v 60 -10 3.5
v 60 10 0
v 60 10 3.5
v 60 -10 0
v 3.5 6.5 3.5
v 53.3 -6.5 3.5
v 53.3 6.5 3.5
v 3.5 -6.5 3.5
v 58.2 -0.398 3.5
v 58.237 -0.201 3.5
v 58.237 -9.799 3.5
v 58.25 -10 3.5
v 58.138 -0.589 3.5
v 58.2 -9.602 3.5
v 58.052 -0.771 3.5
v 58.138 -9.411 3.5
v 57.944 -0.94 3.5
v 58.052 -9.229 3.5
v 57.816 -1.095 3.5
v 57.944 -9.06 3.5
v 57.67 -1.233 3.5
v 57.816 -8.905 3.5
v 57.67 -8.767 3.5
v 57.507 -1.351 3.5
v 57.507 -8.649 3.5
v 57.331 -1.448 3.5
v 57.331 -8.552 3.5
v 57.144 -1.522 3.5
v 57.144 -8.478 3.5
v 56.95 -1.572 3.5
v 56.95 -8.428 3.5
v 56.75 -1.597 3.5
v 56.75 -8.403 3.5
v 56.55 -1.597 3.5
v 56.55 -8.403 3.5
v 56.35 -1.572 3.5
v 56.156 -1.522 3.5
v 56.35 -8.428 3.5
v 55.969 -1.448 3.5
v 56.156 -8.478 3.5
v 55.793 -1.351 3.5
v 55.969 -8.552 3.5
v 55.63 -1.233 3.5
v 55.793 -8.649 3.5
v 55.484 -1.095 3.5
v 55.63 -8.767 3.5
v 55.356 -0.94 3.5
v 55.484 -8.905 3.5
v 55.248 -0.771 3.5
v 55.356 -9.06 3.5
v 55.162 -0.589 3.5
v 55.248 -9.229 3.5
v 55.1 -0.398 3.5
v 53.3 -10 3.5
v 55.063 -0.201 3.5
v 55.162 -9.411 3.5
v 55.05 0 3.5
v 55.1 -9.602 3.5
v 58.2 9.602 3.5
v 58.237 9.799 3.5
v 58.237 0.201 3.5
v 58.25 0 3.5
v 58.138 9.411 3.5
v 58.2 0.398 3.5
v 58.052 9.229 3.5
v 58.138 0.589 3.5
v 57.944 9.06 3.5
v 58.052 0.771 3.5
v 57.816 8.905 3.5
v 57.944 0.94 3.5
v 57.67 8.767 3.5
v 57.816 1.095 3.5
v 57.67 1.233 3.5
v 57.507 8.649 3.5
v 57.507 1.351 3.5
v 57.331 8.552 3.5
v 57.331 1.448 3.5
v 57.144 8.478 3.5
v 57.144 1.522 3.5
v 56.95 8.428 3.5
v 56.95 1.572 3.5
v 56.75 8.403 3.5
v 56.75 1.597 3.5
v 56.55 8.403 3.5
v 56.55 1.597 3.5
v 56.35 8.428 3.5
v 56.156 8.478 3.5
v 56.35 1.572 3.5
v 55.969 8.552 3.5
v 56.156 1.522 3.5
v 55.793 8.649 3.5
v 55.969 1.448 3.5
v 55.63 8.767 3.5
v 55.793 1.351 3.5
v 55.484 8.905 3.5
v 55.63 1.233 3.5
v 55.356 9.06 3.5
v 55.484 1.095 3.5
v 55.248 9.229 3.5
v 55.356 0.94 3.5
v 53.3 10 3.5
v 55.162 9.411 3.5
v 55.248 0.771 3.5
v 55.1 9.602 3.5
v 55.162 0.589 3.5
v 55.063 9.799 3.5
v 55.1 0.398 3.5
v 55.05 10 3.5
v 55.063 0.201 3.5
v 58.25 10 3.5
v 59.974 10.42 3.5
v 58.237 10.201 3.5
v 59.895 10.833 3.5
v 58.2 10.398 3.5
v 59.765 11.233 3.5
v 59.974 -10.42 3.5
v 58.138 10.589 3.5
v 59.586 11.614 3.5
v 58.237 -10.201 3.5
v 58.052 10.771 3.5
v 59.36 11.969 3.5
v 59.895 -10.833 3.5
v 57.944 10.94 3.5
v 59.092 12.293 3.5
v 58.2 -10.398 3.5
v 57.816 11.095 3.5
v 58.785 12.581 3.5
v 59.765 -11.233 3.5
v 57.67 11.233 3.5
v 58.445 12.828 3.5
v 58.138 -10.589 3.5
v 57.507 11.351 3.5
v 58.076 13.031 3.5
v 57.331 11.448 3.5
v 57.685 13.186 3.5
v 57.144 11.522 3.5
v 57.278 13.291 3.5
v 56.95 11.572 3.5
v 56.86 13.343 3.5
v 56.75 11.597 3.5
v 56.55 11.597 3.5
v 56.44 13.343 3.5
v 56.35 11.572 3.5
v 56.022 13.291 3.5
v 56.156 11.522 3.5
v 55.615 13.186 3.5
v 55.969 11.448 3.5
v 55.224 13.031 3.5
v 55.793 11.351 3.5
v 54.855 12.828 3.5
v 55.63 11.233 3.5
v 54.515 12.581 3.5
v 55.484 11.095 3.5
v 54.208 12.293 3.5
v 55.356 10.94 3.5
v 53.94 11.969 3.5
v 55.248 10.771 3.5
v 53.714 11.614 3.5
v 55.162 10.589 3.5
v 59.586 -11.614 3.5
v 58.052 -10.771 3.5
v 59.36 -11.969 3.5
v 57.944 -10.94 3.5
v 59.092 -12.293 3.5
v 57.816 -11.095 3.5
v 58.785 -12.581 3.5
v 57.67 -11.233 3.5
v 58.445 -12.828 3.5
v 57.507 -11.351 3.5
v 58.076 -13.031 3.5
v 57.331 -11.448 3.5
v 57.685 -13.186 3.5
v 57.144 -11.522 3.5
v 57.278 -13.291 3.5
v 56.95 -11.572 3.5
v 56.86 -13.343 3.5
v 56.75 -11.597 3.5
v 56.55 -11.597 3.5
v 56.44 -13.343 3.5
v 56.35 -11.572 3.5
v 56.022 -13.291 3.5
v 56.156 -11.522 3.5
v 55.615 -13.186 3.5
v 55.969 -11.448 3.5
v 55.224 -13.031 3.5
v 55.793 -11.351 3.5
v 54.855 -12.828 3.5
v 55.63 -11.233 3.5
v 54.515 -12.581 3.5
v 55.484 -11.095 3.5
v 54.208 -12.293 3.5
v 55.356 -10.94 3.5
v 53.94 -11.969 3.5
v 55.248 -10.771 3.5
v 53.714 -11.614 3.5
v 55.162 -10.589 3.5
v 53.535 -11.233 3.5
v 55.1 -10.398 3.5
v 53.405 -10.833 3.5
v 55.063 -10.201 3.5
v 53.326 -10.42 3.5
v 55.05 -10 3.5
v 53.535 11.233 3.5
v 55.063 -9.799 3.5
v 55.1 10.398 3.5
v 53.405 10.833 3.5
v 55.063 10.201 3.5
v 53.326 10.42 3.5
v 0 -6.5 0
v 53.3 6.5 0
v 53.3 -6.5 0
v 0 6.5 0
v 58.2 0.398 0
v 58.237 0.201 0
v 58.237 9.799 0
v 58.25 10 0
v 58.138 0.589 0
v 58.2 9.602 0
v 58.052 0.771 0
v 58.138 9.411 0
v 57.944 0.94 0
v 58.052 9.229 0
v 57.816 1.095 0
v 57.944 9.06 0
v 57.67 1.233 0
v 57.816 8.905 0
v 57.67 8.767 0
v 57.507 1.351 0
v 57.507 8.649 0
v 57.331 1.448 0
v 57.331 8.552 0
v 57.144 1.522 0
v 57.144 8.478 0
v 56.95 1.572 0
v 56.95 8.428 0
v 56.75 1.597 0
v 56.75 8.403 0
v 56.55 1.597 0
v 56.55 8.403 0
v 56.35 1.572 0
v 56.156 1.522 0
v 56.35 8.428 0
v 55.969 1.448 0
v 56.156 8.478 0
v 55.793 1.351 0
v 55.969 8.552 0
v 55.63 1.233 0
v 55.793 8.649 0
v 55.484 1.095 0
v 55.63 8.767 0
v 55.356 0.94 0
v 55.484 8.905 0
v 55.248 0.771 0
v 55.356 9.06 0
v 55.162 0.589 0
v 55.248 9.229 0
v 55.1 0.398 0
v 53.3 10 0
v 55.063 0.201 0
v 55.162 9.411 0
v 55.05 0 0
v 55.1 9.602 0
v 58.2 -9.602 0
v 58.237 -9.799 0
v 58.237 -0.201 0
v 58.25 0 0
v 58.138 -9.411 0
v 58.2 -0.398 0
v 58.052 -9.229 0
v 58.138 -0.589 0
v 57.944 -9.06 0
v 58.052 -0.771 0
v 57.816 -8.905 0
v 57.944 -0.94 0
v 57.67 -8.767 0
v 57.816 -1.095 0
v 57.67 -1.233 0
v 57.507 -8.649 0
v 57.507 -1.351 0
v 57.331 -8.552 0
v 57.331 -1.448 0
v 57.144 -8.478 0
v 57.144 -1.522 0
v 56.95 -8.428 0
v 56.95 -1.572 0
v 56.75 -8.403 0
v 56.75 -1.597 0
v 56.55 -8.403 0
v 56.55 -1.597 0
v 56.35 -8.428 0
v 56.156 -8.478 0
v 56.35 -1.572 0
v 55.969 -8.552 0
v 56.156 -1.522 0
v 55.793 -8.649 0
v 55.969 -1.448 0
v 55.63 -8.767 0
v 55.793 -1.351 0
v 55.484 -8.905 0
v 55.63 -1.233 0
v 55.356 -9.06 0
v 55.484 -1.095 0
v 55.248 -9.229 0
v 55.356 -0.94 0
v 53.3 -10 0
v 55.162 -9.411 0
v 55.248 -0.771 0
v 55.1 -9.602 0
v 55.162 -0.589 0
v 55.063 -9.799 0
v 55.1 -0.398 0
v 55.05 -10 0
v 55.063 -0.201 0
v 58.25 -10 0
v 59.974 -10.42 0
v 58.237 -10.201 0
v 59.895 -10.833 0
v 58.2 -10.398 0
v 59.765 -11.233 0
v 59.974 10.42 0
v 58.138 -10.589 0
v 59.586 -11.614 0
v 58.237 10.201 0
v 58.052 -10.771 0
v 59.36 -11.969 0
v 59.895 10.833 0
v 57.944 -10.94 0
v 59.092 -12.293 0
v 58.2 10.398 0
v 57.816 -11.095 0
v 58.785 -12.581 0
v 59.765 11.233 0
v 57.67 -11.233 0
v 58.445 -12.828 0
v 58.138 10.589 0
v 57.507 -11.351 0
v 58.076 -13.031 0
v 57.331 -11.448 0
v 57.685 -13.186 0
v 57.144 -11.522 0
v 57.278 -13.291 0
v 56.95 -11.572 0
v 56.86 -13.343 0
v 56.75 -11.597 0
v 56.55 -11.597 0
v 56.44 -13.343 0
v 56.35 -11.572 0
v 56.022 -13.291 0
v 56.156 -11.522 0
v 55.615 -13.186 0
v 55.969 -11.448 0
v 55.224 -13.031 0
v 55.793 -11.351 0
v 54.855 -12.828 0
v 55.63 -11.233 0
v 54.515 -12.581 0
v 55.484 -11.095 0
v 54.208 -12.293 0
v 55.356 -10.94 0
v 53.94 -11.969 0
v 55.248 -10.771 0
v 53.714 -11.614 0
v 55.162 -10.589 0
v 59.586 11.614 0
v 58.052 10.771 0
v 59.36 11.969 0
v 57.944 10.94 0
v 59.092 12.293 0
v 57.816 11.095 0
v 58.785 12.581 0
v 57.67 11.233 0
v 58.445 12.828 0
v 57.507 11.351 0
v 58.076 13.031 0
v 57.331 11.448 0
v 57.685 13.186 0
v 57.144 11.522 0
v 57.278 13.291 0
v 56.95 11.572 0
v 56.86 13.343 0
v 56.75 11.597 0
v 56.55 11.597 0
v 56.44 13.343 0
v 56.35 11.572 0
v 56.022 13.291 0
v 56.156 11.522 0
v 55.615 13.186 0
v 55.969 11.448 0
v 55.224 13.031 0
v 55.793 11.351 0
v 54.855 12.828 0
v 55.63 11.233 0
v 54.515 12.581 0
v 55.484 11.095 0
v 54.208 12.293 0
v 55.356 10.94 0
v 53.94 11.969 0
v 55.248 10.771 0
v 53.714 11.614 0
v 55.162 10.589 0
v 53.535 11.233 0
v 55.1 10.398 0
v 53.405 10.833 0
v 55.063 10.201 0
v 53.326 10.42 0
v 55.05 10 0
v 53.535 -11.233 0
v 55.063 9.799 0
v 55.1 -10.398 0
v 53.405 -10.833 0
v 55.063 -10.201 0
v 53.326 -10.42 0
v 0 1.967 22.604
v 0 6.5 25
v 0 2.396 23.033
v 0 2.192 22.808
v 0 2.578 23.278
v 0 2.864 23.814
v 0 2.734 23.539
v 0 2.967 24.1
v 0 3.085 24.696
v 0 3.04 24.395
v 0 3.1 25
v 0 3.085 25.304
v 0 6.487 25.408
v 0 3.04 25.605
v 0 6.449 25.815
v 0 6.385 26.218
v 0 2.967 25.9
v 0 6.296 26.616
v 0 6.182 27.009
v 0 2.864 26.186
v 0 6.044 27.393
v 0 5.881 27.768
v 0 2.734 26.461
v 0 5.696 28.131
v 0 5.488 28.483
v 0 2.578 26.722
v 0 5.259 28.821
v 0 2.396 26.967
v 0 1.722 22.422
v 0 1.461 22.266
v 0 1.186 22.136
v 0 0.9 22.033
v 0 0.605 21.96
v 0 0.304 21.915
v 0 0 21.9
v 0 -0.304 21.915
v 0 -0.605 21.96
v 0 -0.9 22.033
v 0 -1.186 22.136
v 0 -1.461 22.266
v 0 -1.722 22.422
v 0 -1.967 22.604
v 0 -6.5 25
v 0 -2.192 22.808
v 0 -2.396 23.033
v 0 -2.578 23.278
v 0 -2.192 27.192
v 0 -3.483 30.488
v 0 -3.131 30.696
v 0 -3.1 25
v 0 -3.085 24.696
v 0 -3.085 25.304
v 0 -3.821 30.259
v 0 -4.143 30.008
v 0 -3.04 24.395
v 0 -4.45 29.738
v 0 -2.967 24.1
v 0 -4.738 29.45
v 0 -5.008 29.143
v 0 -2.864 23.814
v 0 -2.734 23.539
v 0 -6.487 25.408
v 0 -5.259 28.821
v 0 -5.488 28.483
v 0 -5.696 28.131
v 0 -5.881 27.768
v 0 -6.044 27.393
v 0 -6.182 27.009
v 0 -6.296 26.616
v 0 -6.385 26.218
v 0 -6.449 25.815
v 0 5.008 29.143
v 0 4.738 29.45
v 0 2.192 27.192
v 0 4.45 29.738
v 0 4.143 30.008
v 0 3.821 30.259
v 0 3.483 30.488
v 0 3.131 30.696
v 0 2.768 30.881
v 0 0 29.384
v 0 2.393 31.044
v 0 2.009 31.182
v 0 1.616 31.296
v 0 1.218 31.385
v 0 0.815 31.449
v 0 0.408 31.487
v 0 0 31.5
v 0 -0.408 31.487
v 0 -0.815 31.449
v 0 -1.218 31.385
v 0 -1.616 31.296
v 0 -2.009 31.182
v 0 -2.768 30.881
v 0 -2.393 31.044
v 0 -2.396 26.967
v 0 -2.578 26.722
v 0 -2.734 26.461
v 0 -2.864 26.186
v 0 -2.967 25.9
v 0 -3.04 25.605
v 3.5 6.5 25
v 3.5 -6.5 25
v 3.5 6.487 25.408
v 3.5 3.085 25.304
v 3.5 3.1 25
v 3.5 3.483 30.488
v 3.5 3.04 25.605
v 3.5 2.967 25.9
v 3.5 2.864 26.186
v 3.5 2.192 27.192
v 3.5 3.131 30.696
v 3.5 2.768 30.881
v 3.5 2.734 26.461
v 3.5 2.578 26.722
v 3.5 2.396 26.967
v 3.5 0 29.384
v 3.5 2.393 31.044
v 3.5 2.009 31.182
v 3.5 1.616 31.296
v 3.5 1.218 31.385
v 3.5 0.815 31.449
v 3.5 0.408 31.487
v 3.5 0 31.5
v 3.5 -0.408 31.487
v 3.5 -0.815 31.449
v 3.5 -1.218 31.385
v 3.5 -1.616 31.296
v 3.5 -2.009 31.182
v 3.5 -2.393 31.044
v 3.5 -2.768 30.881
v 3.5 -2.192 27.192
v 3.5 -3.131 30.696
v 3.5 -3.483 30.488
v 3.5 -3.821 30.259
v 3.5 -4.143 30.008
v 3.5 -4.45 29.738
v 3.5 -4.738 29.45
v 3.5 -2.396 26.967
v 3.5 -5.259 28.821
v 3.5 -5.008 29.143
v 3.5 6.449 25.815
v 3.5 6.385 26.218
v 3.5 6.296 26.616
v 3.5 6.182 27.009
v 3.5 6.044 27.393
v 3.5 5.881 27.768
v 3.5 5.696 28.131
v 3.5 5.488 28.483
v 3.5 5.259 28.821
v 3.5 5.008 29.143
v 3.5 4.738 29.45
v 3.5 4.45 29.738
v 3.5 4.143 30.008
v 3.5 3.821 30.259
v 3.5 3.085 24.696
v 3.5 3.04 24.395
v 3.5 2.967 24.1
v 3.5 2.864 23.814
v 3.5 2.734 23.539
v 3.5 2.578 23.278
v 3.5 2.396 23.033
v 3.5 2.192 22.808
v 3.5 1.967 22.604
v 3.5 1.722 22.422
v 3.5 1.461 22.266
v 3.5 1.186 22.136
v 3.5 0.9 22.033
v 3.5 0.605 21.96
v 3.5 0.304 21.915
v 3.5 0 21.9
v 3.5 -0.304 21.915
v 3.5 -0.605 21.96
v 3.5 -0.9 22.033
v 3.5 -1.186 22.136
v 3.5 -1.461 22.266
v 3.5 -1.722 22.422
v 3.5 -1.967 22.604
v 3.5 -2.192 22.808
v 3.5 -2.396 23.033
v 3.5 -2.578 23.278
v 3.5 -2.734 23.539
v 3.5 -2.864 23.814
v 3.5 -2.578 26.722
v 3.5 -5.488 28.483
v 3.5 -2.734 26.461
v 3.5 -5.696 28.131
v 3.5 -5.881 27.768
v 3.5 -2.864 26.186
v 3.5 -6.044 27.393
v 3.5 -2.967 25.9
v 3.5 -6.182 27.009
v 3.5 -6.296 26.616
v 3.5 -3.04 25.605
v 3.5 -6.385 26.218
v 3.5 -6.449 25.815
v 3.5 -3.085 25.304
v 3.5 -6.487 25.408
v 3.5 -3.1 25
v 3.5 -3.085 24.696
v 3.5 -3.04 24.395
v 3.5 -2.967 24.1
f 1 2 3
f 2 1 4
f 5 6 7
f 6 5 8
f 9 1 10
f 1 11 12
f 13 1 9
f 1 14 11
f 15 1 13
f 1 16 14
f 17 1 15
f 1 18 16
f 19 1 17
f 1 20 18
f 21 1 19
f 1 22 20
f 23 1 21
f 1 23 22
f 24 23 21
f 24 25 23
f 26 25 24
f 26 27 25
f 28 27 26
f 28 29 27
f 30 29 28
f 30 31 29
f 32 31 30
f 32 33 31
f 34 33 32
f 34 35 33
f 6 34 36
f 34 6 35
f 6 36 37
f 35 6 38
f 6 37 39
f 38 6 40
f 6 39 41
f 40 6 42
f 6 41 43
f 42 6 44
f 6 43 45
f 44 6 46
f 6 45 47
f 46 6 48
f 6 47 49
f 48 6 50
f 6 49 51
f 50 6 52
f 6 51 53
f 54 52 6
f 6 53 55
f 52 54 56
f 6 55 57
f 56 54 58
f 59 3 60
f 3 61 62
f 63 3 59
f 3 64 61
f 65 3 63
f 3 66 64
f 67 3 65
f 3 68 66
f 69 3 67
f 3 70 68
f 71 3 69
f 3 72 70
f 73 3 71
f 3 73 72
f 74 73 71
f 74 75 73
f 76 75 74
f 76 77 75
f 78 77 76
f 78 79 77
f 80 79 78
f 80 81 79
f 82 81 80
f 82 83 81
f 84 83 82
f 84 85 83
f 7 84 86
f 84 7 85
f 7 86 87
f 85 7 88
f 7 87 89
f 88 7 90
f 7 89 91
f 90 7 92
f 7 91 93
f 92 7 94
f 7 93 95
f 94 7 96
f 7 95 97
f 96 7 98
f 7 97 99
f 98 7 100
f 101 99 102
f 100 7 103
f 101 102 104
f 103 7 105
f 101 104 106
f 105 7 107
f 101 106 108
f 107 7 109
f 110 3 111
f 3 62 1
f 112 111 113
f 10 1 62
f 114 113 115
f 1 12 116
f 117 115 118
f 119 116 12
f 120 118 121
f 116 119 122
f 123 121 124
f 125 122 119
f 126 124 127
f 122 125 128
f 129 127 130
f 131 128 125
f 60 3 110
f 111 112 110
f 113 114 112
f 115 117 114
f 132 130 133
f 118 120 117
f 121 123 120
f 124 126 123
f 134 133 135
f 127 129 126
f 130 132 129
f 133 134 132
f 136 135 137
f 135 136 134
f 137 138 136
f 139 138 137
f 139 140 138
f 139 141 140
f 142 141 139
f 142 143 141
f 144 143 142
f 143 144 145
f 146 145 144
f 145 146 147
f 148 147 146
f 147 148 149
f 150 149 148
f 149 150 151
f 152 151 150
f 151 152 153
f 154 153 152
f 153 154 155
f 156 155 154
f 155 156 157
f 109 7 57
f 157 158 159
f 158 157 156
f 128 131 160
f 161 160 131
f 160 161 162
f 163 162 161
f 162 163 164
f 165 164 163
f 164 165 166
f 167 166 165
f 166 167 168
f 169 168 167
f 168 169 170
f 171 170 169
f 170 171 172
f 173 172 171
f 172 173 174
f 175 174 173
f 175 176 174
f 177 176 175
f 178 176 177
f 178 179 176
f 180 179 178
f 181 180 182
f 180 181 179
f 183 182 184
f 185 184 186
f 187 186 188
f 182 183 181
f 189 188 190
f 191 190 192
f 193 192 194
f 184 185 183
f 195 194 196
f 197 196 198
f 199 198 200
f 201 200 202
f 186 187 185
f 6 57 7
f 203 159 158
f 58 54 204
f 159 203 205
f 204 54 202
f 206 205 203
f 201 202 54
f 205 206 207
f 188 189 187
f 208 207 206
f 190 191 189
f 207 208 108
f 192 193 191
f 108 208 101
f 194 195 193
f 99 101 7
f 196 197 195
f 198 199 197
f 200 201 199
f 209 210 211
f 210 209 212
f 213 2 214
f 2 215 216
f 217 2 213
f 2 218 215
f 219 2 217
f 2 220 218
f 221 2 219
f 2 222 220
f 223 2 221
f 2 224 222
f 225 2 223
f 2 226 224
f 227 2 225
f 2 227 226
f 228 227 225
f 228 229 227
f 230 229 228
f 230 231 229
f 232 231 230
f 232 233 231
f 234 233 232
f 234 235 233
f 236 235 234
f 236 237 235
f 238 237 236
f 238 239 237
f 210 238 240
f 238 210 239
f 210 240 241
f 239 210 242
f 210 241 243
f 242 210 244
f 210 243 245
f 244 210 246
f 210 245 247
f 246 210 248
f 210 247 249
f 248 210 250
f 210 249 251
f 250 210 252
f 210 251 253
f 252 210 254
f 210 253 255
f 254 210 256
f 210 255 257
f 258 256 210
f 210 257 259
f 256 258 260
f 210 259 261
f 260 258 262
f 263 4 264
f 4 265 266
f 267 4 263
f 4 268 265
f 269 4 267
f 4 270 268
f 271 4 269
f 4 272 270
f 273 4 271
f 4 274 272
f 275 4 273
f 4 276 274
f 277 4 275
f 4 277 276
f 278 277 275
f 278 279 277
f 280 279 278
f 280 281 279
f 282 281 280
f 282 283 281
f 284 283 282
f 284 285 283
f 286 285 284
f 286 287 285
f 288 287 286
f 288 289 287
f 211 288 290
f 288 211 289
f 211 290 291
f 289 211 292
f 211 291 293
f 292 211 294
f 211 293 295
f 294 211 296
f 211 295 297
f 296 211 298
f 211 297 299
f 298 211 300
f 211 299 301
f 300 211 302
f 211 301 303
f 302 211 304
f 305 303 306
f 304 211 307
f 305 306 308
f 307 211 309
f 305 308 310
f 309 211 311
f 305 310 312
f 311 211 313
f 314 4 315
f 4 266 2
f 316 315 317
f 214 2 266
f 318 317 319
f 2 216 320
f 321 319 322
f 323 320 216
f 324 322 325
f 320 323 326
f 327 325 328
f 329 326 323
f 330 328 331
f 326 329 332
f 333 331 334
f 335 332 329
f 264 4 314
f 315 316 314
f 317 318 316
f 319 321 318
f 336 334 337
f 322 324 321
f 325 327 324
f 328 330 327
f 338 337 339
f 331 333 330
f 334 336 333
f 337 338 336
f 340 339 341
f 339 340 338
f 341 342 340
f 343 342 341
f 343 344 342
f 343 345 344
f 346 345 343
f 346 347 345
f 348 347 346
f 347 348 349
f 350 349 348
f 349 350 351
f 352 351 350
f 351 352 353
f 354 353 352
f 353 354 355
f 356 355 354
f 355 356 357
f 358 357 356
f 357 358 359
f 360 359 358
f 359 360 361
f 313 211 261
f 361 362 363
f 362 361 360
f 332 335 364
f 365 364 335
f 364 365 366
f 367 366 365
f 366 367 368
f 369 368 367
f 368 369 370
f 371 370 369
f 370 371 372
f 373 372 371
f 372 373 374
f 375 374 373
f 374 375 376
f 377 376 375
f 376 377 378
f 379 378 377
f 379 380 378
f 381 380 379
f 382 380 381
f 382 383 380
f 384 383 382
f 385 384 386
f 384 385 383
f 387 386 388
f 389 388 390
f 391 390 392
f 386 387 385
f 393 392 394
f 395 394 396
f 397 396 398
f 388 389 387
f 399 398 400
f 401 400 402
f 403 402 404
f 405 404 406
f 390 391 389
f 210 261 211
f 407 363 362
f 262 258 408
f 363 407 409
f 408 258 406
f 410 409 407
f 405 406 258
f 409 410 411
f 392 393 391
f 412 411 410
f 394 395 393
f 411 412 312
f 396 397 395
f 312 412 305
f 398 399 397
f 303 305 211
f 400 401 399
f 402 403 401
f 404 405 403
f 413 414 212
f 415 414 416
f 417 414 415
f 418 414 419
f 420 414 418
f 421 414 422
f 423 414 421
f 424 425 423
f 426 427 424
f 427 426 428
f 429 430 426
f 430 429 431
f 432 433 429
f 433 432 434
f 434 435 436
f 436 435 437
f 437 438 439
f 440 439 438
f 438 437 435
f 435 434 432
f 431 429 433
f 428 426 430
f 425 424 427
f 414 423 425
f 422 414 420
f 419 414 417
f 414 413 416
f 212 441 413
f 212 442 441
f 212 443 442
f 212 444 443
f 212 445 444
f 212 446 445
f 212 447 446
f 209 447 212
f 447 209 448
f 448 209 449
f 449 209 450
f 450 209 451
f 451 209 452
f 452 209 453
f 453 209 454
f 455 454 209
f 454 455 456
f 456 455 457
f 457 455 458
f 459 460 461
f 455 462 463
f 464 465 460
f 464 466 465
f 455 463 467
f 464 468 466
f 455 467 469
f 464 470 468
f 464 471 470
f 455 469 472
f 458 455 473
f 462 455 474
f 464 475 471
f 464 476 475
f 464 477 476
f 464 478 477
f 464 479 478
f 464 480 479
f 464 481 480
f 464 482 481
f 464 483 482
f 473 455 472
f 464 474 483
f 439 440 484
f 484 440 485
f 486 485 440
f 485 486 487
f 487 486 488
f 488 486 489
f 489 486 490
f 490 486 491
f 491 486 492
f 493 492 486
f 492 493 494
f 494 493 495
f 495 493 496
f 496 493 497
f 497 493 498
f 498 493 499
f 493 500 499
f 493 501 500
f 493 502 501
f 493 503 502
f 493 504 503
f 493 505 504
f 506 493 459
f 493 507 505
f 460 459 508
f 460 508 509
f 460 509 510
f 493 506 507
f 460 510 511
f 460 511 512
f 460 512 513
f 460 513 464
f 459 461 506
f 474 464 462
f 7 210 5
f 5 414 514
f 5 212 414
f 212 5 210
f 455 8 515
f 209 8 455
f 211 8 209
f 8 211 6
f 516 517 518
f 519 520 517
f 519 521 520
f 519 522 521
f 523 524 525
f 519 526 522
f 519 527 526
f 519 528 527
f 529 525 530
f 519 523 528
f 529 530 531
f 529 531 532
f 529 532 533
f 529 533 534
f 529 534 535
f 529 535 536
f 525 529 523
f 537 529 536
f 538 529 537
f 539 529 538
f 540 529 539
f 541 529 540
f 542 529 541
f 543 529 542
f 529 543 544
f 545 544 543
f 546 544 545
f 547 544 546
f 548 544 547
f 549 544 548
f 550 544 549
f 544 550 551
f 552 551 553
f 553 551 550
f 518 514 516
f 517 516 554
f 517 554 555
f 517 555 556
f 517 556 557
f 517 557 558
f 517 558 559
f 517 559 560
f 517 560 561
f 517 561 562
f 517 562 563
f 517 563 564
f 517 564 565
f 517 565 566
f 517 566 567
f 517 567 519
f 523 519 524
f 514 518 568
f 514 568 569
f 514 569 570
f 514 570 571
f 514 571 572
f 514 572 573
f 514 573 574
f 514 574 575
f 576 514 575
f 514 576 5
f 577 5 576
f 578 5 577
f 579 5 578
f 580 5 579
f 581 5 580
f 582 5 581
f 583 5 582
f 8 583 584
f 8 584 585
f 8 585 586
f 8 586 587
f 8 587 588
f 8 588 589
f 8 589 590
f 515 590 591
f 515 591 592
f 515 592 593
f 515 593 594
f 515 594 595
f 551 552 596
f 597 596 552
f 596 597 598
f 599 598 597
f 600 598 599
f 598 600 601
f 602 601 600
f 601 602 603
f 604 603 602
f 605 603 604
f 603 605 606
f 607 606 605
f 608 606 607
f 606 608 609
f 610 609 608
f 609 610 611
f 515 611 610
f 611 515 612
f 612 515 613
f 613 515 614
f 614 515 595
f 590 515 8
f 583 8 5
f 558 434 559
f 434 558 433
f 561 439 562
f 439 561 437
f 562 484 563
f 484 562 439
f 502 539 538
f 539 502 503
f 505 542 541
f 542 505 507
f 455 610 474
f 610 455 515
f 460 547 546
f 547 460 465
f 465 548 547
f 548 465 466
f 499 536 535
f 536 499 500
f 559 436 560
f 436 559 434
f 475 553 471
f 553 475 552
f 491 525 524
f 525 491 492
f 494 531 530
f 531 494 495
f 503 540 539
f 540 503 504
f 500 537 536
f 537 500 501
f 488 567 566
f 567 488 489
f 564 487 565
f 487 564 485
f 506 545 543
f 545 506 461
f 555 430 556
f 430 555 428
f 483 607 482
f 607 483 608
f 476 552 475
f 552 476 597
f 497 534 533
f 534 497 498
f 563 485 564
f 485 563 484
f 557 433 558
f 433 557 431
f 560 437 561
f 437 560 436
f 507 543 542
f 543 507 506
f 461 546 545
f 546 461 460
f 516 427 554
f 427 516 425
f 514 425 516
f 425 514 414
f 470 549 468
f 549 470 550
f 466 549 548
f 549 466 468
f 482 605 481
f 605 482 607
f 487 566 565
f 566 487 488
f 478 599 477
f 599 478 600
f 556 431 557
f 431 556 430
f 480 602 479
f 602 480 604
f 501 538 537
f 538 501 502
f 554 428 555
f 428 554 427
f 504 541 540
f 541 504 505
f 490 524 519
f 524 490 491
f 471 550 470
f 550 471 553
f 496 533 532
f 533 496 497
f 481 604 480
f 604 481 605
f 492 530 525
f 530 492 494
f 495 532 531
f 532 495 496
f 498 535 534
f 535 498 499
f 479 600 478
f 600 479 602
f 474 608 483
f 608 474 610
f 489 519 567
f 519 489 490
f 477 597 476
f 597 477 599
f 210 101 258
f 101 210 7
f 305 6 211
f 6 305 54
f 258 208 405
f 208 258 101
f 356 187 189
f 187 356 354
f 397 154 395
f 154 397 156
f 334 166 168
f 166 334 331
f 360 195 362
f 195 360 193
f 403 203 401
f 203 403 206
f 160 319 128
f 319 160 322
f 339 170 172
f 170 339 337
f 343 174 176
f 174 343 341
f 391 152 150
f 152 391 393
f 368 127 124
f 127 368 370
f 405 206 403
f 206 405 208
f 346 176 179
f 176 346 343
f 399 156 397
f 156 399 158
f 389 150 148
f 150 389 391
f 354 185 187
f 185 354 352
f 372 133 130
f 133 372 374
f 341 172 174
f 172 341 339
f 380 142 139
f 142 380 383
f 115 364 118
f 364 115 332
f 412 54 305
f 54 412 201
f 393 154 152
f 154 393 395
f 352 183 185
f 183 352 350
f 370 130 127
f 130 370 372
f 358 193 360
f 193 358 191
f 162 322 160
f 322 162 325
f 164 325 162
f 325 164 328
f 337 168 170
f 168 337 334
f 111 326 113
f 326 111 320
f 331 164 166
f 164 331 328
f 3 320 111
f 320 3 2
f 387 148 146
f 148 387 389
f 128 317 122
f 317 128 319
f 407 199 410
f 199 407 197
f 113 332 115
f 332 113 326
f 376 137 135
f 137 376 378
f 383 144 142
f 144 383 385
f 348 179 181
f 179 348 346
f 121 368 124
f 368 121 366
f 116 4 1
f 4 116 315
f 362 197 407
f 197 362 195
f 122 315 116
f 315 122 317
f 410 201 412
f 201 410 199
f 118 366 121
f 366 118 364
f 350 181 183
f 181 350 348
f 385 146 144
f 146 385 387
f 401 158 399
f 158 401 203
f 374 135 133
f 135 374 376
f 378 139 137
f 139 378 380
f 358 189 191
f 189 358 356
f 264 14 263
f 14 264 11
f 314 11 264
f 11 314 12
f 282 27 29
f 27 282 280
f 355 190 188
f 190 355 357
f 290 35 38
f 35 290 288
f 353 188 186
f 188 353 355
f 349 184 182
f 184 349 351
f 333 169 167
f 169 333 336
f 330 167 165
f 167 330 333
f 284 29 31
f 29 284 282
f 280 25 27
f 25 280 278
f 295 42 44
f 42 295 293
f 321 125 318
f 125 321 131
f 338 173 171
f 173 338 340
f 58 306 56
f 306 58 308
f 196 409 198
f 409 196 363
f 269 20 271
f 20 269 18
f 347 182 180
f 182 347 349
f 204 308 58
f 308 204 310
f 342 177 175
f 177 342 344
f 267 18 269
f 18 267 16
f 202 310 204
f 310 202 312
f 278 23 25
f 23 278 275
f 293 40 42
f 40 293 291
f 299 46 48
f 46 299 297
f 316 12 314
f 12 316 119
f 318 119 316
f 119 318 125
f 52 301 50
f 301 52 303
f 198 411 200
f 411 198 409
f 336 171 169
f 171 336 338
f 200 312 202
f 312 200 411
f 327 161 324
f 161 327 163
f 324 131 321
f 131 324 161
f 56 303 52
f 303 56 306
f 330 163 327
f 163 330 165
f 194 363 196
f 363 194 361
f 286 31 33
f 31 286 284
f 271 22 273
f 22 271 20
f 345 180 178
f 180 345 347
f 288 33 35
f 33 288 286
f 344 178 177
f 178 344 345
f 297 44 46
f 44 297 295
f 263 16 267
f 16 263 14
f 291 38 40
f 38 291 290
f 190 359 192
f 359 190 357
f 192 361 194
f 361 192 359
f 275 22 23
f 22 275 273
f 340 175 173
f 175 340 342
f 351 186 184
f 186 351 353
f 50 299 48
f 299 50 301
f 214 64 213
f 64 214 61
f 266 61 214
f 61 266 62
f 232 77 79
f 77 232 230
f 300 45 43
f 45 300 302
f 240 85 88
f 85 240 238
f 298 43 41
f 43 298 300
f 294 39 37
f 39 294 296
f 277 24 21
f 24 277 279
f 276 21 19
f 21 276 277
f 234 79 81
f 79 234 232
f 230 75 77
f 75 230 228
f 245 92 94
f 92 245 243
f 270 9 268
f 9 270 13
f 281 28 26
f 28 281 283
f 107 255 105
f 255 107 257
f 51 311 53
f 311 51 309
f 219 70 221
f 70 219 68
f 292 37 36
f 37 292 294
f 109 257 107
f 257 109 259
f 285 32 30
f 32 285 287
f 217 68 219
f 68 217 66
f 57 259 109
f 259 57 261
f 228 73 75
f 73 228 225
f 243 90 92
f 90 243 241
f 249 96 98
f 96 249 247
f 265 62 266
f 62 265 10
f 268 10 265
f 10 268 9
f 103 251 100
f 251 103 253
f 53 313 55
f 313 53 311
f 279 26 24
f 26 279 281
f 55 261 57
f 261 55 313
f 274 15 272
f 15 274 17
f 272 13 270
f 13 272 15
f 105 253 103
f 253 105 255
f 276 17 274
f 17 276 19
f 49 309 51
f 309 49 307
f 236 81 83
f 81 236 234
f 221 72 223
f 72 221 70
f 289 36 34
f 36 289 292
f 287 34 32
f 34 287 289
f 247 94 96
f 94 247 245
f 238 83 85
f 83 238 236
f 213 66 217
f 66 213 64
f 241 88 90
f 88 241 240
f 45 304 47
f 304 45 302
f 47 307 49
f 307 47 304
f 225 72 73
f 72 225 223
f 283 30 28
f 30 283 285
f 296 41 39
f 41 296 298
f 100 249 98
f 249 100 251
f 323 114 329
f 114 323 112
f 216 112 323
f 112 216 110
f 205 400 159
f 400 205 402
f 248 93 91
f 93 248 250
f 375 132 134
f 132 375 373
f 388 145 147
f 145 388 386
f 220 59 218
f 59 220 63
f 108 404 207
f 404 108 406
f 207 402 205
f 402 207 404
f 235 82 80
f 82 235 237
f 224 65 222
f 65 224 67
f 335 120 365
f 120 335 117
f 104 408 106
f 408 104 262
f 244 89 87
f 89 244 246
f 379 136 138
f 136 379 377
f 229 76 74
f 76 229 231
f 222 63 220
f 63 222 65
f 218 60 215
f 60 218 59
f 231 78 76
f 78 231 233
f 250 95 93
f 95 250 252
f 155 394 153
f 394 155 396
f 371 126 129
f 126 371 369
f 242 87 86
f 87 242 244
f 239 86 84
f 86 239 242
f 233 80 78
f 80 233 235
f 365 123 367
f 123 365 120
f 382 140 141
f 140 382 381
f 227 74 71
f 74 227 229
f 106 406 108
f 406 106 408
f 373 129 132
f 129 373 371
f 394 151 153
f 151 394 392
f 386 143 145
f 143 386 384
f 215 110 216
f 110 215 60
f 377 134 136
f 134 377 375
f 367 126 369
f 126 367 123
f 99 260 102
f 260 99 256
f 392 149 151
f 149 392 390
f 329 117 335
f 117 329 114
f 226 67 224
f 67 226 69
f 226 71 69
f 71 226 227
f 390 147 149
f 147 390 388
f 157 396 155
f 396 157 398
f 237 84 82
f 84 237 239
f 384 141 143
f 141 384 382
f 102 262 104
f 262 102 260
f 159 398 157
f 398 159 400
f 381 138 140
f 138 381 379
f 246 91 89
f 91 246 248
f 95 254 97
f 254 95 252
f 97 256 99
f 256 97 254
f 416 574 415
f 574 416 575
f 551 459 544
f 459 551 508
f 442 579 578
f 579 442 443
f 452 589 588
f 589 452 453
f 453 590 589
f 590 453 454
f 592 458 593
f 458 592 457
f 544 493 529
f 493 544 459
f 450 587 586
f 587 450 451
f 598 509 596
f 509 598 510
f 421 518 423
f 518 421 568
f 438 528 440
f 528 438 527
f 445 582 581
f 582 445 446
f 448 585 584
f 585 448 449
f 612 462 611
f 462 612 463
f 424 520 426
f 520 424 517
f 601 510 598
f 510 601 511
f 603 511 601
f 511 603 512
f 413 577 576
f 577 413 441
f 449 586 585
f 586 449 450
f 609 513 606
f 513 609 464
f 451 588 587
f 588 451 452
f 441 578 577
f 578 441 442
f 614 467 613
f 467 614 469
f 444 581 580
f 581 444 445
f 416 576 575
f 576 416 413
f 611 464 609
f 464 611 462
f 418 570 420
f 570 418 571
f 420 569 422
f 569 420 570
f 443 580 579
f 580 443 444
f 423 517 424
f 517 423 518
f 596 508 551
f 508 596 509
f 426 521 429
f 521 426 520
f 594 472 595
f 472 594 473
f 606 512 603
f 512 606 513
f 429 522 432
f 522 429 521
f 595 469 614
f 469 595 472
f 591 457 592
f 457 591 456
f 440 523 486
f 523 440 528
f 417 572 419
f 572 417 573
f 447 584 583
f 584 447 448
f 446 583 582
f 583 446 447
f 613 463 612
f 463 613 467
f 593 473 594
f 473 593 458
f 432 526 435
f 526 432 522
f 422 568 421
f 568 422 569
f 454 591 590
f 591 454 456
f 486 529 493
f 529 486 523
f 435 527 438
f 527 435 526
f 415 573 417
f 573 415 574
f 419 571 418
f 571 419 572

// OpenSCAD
// file: teardrop.scad
module teardrop(radius = 10, length = 20) {
    rotate([90, 0, 0]) {
        rotate([0, 0, 45]) {
            translate([0, 0, -length / 2]) {
                linear_extrude(height = length) {
                    union() {
                        circle(r = radius, $fn = 64);
                        square([radius, radius]);
                    }
                }
            }
        }
    }
}
// main file
use <teardrop.scad>

module camera_holder(
        holder_height = 60,
        holder_width = 13,
        holder_length = 25,
        thickness = 3.5,
        camera_screw_diameter = 6.2,
        screw_diameter = 3.2) {
    difference() {
        union() {
            translate([0, -holder_width / 2, 0]) {
                cube([holder_height, holder_width, thickness]);
                cube([thickness, holder_width, holder_length]);
            }
            translate([0, 0, holder_length]) {
                rotate([0, 90, 0]) {
                    cylinder(d = holder_width, h = thickness, $fn = 100);
                }
            }
            hull() {
                translate([holder_height - screw_diameter / 2 - thickness / 2, -10, 0]) {
                    cylinder(d = screw_diameter + thickness, h = thickness, $fn = 50);
                }
                translate([holder_height - screw_diameter / 2 - thickness / 2, 10, 0]) {
                    cylinder(d = screw_diameter + thickness, h = thickness, $fn = 50);
                }
            }
        }
        translate([0, 0, holder_length]) {
            rotate([0, 0, 90]) {
                teardrop(radius = camera_screw_diameter / 2, length = 10);
            }
        }
        for (i = [-1:1]) {
            translate([holder_height - screw_diameter / 2 - thickness / 2, i * 10, -0.1]) {
                cylinder(d = screw_diameter, h = thickness + 1, $fn = 50);
            }
        }
    }
}

camera_holder();
